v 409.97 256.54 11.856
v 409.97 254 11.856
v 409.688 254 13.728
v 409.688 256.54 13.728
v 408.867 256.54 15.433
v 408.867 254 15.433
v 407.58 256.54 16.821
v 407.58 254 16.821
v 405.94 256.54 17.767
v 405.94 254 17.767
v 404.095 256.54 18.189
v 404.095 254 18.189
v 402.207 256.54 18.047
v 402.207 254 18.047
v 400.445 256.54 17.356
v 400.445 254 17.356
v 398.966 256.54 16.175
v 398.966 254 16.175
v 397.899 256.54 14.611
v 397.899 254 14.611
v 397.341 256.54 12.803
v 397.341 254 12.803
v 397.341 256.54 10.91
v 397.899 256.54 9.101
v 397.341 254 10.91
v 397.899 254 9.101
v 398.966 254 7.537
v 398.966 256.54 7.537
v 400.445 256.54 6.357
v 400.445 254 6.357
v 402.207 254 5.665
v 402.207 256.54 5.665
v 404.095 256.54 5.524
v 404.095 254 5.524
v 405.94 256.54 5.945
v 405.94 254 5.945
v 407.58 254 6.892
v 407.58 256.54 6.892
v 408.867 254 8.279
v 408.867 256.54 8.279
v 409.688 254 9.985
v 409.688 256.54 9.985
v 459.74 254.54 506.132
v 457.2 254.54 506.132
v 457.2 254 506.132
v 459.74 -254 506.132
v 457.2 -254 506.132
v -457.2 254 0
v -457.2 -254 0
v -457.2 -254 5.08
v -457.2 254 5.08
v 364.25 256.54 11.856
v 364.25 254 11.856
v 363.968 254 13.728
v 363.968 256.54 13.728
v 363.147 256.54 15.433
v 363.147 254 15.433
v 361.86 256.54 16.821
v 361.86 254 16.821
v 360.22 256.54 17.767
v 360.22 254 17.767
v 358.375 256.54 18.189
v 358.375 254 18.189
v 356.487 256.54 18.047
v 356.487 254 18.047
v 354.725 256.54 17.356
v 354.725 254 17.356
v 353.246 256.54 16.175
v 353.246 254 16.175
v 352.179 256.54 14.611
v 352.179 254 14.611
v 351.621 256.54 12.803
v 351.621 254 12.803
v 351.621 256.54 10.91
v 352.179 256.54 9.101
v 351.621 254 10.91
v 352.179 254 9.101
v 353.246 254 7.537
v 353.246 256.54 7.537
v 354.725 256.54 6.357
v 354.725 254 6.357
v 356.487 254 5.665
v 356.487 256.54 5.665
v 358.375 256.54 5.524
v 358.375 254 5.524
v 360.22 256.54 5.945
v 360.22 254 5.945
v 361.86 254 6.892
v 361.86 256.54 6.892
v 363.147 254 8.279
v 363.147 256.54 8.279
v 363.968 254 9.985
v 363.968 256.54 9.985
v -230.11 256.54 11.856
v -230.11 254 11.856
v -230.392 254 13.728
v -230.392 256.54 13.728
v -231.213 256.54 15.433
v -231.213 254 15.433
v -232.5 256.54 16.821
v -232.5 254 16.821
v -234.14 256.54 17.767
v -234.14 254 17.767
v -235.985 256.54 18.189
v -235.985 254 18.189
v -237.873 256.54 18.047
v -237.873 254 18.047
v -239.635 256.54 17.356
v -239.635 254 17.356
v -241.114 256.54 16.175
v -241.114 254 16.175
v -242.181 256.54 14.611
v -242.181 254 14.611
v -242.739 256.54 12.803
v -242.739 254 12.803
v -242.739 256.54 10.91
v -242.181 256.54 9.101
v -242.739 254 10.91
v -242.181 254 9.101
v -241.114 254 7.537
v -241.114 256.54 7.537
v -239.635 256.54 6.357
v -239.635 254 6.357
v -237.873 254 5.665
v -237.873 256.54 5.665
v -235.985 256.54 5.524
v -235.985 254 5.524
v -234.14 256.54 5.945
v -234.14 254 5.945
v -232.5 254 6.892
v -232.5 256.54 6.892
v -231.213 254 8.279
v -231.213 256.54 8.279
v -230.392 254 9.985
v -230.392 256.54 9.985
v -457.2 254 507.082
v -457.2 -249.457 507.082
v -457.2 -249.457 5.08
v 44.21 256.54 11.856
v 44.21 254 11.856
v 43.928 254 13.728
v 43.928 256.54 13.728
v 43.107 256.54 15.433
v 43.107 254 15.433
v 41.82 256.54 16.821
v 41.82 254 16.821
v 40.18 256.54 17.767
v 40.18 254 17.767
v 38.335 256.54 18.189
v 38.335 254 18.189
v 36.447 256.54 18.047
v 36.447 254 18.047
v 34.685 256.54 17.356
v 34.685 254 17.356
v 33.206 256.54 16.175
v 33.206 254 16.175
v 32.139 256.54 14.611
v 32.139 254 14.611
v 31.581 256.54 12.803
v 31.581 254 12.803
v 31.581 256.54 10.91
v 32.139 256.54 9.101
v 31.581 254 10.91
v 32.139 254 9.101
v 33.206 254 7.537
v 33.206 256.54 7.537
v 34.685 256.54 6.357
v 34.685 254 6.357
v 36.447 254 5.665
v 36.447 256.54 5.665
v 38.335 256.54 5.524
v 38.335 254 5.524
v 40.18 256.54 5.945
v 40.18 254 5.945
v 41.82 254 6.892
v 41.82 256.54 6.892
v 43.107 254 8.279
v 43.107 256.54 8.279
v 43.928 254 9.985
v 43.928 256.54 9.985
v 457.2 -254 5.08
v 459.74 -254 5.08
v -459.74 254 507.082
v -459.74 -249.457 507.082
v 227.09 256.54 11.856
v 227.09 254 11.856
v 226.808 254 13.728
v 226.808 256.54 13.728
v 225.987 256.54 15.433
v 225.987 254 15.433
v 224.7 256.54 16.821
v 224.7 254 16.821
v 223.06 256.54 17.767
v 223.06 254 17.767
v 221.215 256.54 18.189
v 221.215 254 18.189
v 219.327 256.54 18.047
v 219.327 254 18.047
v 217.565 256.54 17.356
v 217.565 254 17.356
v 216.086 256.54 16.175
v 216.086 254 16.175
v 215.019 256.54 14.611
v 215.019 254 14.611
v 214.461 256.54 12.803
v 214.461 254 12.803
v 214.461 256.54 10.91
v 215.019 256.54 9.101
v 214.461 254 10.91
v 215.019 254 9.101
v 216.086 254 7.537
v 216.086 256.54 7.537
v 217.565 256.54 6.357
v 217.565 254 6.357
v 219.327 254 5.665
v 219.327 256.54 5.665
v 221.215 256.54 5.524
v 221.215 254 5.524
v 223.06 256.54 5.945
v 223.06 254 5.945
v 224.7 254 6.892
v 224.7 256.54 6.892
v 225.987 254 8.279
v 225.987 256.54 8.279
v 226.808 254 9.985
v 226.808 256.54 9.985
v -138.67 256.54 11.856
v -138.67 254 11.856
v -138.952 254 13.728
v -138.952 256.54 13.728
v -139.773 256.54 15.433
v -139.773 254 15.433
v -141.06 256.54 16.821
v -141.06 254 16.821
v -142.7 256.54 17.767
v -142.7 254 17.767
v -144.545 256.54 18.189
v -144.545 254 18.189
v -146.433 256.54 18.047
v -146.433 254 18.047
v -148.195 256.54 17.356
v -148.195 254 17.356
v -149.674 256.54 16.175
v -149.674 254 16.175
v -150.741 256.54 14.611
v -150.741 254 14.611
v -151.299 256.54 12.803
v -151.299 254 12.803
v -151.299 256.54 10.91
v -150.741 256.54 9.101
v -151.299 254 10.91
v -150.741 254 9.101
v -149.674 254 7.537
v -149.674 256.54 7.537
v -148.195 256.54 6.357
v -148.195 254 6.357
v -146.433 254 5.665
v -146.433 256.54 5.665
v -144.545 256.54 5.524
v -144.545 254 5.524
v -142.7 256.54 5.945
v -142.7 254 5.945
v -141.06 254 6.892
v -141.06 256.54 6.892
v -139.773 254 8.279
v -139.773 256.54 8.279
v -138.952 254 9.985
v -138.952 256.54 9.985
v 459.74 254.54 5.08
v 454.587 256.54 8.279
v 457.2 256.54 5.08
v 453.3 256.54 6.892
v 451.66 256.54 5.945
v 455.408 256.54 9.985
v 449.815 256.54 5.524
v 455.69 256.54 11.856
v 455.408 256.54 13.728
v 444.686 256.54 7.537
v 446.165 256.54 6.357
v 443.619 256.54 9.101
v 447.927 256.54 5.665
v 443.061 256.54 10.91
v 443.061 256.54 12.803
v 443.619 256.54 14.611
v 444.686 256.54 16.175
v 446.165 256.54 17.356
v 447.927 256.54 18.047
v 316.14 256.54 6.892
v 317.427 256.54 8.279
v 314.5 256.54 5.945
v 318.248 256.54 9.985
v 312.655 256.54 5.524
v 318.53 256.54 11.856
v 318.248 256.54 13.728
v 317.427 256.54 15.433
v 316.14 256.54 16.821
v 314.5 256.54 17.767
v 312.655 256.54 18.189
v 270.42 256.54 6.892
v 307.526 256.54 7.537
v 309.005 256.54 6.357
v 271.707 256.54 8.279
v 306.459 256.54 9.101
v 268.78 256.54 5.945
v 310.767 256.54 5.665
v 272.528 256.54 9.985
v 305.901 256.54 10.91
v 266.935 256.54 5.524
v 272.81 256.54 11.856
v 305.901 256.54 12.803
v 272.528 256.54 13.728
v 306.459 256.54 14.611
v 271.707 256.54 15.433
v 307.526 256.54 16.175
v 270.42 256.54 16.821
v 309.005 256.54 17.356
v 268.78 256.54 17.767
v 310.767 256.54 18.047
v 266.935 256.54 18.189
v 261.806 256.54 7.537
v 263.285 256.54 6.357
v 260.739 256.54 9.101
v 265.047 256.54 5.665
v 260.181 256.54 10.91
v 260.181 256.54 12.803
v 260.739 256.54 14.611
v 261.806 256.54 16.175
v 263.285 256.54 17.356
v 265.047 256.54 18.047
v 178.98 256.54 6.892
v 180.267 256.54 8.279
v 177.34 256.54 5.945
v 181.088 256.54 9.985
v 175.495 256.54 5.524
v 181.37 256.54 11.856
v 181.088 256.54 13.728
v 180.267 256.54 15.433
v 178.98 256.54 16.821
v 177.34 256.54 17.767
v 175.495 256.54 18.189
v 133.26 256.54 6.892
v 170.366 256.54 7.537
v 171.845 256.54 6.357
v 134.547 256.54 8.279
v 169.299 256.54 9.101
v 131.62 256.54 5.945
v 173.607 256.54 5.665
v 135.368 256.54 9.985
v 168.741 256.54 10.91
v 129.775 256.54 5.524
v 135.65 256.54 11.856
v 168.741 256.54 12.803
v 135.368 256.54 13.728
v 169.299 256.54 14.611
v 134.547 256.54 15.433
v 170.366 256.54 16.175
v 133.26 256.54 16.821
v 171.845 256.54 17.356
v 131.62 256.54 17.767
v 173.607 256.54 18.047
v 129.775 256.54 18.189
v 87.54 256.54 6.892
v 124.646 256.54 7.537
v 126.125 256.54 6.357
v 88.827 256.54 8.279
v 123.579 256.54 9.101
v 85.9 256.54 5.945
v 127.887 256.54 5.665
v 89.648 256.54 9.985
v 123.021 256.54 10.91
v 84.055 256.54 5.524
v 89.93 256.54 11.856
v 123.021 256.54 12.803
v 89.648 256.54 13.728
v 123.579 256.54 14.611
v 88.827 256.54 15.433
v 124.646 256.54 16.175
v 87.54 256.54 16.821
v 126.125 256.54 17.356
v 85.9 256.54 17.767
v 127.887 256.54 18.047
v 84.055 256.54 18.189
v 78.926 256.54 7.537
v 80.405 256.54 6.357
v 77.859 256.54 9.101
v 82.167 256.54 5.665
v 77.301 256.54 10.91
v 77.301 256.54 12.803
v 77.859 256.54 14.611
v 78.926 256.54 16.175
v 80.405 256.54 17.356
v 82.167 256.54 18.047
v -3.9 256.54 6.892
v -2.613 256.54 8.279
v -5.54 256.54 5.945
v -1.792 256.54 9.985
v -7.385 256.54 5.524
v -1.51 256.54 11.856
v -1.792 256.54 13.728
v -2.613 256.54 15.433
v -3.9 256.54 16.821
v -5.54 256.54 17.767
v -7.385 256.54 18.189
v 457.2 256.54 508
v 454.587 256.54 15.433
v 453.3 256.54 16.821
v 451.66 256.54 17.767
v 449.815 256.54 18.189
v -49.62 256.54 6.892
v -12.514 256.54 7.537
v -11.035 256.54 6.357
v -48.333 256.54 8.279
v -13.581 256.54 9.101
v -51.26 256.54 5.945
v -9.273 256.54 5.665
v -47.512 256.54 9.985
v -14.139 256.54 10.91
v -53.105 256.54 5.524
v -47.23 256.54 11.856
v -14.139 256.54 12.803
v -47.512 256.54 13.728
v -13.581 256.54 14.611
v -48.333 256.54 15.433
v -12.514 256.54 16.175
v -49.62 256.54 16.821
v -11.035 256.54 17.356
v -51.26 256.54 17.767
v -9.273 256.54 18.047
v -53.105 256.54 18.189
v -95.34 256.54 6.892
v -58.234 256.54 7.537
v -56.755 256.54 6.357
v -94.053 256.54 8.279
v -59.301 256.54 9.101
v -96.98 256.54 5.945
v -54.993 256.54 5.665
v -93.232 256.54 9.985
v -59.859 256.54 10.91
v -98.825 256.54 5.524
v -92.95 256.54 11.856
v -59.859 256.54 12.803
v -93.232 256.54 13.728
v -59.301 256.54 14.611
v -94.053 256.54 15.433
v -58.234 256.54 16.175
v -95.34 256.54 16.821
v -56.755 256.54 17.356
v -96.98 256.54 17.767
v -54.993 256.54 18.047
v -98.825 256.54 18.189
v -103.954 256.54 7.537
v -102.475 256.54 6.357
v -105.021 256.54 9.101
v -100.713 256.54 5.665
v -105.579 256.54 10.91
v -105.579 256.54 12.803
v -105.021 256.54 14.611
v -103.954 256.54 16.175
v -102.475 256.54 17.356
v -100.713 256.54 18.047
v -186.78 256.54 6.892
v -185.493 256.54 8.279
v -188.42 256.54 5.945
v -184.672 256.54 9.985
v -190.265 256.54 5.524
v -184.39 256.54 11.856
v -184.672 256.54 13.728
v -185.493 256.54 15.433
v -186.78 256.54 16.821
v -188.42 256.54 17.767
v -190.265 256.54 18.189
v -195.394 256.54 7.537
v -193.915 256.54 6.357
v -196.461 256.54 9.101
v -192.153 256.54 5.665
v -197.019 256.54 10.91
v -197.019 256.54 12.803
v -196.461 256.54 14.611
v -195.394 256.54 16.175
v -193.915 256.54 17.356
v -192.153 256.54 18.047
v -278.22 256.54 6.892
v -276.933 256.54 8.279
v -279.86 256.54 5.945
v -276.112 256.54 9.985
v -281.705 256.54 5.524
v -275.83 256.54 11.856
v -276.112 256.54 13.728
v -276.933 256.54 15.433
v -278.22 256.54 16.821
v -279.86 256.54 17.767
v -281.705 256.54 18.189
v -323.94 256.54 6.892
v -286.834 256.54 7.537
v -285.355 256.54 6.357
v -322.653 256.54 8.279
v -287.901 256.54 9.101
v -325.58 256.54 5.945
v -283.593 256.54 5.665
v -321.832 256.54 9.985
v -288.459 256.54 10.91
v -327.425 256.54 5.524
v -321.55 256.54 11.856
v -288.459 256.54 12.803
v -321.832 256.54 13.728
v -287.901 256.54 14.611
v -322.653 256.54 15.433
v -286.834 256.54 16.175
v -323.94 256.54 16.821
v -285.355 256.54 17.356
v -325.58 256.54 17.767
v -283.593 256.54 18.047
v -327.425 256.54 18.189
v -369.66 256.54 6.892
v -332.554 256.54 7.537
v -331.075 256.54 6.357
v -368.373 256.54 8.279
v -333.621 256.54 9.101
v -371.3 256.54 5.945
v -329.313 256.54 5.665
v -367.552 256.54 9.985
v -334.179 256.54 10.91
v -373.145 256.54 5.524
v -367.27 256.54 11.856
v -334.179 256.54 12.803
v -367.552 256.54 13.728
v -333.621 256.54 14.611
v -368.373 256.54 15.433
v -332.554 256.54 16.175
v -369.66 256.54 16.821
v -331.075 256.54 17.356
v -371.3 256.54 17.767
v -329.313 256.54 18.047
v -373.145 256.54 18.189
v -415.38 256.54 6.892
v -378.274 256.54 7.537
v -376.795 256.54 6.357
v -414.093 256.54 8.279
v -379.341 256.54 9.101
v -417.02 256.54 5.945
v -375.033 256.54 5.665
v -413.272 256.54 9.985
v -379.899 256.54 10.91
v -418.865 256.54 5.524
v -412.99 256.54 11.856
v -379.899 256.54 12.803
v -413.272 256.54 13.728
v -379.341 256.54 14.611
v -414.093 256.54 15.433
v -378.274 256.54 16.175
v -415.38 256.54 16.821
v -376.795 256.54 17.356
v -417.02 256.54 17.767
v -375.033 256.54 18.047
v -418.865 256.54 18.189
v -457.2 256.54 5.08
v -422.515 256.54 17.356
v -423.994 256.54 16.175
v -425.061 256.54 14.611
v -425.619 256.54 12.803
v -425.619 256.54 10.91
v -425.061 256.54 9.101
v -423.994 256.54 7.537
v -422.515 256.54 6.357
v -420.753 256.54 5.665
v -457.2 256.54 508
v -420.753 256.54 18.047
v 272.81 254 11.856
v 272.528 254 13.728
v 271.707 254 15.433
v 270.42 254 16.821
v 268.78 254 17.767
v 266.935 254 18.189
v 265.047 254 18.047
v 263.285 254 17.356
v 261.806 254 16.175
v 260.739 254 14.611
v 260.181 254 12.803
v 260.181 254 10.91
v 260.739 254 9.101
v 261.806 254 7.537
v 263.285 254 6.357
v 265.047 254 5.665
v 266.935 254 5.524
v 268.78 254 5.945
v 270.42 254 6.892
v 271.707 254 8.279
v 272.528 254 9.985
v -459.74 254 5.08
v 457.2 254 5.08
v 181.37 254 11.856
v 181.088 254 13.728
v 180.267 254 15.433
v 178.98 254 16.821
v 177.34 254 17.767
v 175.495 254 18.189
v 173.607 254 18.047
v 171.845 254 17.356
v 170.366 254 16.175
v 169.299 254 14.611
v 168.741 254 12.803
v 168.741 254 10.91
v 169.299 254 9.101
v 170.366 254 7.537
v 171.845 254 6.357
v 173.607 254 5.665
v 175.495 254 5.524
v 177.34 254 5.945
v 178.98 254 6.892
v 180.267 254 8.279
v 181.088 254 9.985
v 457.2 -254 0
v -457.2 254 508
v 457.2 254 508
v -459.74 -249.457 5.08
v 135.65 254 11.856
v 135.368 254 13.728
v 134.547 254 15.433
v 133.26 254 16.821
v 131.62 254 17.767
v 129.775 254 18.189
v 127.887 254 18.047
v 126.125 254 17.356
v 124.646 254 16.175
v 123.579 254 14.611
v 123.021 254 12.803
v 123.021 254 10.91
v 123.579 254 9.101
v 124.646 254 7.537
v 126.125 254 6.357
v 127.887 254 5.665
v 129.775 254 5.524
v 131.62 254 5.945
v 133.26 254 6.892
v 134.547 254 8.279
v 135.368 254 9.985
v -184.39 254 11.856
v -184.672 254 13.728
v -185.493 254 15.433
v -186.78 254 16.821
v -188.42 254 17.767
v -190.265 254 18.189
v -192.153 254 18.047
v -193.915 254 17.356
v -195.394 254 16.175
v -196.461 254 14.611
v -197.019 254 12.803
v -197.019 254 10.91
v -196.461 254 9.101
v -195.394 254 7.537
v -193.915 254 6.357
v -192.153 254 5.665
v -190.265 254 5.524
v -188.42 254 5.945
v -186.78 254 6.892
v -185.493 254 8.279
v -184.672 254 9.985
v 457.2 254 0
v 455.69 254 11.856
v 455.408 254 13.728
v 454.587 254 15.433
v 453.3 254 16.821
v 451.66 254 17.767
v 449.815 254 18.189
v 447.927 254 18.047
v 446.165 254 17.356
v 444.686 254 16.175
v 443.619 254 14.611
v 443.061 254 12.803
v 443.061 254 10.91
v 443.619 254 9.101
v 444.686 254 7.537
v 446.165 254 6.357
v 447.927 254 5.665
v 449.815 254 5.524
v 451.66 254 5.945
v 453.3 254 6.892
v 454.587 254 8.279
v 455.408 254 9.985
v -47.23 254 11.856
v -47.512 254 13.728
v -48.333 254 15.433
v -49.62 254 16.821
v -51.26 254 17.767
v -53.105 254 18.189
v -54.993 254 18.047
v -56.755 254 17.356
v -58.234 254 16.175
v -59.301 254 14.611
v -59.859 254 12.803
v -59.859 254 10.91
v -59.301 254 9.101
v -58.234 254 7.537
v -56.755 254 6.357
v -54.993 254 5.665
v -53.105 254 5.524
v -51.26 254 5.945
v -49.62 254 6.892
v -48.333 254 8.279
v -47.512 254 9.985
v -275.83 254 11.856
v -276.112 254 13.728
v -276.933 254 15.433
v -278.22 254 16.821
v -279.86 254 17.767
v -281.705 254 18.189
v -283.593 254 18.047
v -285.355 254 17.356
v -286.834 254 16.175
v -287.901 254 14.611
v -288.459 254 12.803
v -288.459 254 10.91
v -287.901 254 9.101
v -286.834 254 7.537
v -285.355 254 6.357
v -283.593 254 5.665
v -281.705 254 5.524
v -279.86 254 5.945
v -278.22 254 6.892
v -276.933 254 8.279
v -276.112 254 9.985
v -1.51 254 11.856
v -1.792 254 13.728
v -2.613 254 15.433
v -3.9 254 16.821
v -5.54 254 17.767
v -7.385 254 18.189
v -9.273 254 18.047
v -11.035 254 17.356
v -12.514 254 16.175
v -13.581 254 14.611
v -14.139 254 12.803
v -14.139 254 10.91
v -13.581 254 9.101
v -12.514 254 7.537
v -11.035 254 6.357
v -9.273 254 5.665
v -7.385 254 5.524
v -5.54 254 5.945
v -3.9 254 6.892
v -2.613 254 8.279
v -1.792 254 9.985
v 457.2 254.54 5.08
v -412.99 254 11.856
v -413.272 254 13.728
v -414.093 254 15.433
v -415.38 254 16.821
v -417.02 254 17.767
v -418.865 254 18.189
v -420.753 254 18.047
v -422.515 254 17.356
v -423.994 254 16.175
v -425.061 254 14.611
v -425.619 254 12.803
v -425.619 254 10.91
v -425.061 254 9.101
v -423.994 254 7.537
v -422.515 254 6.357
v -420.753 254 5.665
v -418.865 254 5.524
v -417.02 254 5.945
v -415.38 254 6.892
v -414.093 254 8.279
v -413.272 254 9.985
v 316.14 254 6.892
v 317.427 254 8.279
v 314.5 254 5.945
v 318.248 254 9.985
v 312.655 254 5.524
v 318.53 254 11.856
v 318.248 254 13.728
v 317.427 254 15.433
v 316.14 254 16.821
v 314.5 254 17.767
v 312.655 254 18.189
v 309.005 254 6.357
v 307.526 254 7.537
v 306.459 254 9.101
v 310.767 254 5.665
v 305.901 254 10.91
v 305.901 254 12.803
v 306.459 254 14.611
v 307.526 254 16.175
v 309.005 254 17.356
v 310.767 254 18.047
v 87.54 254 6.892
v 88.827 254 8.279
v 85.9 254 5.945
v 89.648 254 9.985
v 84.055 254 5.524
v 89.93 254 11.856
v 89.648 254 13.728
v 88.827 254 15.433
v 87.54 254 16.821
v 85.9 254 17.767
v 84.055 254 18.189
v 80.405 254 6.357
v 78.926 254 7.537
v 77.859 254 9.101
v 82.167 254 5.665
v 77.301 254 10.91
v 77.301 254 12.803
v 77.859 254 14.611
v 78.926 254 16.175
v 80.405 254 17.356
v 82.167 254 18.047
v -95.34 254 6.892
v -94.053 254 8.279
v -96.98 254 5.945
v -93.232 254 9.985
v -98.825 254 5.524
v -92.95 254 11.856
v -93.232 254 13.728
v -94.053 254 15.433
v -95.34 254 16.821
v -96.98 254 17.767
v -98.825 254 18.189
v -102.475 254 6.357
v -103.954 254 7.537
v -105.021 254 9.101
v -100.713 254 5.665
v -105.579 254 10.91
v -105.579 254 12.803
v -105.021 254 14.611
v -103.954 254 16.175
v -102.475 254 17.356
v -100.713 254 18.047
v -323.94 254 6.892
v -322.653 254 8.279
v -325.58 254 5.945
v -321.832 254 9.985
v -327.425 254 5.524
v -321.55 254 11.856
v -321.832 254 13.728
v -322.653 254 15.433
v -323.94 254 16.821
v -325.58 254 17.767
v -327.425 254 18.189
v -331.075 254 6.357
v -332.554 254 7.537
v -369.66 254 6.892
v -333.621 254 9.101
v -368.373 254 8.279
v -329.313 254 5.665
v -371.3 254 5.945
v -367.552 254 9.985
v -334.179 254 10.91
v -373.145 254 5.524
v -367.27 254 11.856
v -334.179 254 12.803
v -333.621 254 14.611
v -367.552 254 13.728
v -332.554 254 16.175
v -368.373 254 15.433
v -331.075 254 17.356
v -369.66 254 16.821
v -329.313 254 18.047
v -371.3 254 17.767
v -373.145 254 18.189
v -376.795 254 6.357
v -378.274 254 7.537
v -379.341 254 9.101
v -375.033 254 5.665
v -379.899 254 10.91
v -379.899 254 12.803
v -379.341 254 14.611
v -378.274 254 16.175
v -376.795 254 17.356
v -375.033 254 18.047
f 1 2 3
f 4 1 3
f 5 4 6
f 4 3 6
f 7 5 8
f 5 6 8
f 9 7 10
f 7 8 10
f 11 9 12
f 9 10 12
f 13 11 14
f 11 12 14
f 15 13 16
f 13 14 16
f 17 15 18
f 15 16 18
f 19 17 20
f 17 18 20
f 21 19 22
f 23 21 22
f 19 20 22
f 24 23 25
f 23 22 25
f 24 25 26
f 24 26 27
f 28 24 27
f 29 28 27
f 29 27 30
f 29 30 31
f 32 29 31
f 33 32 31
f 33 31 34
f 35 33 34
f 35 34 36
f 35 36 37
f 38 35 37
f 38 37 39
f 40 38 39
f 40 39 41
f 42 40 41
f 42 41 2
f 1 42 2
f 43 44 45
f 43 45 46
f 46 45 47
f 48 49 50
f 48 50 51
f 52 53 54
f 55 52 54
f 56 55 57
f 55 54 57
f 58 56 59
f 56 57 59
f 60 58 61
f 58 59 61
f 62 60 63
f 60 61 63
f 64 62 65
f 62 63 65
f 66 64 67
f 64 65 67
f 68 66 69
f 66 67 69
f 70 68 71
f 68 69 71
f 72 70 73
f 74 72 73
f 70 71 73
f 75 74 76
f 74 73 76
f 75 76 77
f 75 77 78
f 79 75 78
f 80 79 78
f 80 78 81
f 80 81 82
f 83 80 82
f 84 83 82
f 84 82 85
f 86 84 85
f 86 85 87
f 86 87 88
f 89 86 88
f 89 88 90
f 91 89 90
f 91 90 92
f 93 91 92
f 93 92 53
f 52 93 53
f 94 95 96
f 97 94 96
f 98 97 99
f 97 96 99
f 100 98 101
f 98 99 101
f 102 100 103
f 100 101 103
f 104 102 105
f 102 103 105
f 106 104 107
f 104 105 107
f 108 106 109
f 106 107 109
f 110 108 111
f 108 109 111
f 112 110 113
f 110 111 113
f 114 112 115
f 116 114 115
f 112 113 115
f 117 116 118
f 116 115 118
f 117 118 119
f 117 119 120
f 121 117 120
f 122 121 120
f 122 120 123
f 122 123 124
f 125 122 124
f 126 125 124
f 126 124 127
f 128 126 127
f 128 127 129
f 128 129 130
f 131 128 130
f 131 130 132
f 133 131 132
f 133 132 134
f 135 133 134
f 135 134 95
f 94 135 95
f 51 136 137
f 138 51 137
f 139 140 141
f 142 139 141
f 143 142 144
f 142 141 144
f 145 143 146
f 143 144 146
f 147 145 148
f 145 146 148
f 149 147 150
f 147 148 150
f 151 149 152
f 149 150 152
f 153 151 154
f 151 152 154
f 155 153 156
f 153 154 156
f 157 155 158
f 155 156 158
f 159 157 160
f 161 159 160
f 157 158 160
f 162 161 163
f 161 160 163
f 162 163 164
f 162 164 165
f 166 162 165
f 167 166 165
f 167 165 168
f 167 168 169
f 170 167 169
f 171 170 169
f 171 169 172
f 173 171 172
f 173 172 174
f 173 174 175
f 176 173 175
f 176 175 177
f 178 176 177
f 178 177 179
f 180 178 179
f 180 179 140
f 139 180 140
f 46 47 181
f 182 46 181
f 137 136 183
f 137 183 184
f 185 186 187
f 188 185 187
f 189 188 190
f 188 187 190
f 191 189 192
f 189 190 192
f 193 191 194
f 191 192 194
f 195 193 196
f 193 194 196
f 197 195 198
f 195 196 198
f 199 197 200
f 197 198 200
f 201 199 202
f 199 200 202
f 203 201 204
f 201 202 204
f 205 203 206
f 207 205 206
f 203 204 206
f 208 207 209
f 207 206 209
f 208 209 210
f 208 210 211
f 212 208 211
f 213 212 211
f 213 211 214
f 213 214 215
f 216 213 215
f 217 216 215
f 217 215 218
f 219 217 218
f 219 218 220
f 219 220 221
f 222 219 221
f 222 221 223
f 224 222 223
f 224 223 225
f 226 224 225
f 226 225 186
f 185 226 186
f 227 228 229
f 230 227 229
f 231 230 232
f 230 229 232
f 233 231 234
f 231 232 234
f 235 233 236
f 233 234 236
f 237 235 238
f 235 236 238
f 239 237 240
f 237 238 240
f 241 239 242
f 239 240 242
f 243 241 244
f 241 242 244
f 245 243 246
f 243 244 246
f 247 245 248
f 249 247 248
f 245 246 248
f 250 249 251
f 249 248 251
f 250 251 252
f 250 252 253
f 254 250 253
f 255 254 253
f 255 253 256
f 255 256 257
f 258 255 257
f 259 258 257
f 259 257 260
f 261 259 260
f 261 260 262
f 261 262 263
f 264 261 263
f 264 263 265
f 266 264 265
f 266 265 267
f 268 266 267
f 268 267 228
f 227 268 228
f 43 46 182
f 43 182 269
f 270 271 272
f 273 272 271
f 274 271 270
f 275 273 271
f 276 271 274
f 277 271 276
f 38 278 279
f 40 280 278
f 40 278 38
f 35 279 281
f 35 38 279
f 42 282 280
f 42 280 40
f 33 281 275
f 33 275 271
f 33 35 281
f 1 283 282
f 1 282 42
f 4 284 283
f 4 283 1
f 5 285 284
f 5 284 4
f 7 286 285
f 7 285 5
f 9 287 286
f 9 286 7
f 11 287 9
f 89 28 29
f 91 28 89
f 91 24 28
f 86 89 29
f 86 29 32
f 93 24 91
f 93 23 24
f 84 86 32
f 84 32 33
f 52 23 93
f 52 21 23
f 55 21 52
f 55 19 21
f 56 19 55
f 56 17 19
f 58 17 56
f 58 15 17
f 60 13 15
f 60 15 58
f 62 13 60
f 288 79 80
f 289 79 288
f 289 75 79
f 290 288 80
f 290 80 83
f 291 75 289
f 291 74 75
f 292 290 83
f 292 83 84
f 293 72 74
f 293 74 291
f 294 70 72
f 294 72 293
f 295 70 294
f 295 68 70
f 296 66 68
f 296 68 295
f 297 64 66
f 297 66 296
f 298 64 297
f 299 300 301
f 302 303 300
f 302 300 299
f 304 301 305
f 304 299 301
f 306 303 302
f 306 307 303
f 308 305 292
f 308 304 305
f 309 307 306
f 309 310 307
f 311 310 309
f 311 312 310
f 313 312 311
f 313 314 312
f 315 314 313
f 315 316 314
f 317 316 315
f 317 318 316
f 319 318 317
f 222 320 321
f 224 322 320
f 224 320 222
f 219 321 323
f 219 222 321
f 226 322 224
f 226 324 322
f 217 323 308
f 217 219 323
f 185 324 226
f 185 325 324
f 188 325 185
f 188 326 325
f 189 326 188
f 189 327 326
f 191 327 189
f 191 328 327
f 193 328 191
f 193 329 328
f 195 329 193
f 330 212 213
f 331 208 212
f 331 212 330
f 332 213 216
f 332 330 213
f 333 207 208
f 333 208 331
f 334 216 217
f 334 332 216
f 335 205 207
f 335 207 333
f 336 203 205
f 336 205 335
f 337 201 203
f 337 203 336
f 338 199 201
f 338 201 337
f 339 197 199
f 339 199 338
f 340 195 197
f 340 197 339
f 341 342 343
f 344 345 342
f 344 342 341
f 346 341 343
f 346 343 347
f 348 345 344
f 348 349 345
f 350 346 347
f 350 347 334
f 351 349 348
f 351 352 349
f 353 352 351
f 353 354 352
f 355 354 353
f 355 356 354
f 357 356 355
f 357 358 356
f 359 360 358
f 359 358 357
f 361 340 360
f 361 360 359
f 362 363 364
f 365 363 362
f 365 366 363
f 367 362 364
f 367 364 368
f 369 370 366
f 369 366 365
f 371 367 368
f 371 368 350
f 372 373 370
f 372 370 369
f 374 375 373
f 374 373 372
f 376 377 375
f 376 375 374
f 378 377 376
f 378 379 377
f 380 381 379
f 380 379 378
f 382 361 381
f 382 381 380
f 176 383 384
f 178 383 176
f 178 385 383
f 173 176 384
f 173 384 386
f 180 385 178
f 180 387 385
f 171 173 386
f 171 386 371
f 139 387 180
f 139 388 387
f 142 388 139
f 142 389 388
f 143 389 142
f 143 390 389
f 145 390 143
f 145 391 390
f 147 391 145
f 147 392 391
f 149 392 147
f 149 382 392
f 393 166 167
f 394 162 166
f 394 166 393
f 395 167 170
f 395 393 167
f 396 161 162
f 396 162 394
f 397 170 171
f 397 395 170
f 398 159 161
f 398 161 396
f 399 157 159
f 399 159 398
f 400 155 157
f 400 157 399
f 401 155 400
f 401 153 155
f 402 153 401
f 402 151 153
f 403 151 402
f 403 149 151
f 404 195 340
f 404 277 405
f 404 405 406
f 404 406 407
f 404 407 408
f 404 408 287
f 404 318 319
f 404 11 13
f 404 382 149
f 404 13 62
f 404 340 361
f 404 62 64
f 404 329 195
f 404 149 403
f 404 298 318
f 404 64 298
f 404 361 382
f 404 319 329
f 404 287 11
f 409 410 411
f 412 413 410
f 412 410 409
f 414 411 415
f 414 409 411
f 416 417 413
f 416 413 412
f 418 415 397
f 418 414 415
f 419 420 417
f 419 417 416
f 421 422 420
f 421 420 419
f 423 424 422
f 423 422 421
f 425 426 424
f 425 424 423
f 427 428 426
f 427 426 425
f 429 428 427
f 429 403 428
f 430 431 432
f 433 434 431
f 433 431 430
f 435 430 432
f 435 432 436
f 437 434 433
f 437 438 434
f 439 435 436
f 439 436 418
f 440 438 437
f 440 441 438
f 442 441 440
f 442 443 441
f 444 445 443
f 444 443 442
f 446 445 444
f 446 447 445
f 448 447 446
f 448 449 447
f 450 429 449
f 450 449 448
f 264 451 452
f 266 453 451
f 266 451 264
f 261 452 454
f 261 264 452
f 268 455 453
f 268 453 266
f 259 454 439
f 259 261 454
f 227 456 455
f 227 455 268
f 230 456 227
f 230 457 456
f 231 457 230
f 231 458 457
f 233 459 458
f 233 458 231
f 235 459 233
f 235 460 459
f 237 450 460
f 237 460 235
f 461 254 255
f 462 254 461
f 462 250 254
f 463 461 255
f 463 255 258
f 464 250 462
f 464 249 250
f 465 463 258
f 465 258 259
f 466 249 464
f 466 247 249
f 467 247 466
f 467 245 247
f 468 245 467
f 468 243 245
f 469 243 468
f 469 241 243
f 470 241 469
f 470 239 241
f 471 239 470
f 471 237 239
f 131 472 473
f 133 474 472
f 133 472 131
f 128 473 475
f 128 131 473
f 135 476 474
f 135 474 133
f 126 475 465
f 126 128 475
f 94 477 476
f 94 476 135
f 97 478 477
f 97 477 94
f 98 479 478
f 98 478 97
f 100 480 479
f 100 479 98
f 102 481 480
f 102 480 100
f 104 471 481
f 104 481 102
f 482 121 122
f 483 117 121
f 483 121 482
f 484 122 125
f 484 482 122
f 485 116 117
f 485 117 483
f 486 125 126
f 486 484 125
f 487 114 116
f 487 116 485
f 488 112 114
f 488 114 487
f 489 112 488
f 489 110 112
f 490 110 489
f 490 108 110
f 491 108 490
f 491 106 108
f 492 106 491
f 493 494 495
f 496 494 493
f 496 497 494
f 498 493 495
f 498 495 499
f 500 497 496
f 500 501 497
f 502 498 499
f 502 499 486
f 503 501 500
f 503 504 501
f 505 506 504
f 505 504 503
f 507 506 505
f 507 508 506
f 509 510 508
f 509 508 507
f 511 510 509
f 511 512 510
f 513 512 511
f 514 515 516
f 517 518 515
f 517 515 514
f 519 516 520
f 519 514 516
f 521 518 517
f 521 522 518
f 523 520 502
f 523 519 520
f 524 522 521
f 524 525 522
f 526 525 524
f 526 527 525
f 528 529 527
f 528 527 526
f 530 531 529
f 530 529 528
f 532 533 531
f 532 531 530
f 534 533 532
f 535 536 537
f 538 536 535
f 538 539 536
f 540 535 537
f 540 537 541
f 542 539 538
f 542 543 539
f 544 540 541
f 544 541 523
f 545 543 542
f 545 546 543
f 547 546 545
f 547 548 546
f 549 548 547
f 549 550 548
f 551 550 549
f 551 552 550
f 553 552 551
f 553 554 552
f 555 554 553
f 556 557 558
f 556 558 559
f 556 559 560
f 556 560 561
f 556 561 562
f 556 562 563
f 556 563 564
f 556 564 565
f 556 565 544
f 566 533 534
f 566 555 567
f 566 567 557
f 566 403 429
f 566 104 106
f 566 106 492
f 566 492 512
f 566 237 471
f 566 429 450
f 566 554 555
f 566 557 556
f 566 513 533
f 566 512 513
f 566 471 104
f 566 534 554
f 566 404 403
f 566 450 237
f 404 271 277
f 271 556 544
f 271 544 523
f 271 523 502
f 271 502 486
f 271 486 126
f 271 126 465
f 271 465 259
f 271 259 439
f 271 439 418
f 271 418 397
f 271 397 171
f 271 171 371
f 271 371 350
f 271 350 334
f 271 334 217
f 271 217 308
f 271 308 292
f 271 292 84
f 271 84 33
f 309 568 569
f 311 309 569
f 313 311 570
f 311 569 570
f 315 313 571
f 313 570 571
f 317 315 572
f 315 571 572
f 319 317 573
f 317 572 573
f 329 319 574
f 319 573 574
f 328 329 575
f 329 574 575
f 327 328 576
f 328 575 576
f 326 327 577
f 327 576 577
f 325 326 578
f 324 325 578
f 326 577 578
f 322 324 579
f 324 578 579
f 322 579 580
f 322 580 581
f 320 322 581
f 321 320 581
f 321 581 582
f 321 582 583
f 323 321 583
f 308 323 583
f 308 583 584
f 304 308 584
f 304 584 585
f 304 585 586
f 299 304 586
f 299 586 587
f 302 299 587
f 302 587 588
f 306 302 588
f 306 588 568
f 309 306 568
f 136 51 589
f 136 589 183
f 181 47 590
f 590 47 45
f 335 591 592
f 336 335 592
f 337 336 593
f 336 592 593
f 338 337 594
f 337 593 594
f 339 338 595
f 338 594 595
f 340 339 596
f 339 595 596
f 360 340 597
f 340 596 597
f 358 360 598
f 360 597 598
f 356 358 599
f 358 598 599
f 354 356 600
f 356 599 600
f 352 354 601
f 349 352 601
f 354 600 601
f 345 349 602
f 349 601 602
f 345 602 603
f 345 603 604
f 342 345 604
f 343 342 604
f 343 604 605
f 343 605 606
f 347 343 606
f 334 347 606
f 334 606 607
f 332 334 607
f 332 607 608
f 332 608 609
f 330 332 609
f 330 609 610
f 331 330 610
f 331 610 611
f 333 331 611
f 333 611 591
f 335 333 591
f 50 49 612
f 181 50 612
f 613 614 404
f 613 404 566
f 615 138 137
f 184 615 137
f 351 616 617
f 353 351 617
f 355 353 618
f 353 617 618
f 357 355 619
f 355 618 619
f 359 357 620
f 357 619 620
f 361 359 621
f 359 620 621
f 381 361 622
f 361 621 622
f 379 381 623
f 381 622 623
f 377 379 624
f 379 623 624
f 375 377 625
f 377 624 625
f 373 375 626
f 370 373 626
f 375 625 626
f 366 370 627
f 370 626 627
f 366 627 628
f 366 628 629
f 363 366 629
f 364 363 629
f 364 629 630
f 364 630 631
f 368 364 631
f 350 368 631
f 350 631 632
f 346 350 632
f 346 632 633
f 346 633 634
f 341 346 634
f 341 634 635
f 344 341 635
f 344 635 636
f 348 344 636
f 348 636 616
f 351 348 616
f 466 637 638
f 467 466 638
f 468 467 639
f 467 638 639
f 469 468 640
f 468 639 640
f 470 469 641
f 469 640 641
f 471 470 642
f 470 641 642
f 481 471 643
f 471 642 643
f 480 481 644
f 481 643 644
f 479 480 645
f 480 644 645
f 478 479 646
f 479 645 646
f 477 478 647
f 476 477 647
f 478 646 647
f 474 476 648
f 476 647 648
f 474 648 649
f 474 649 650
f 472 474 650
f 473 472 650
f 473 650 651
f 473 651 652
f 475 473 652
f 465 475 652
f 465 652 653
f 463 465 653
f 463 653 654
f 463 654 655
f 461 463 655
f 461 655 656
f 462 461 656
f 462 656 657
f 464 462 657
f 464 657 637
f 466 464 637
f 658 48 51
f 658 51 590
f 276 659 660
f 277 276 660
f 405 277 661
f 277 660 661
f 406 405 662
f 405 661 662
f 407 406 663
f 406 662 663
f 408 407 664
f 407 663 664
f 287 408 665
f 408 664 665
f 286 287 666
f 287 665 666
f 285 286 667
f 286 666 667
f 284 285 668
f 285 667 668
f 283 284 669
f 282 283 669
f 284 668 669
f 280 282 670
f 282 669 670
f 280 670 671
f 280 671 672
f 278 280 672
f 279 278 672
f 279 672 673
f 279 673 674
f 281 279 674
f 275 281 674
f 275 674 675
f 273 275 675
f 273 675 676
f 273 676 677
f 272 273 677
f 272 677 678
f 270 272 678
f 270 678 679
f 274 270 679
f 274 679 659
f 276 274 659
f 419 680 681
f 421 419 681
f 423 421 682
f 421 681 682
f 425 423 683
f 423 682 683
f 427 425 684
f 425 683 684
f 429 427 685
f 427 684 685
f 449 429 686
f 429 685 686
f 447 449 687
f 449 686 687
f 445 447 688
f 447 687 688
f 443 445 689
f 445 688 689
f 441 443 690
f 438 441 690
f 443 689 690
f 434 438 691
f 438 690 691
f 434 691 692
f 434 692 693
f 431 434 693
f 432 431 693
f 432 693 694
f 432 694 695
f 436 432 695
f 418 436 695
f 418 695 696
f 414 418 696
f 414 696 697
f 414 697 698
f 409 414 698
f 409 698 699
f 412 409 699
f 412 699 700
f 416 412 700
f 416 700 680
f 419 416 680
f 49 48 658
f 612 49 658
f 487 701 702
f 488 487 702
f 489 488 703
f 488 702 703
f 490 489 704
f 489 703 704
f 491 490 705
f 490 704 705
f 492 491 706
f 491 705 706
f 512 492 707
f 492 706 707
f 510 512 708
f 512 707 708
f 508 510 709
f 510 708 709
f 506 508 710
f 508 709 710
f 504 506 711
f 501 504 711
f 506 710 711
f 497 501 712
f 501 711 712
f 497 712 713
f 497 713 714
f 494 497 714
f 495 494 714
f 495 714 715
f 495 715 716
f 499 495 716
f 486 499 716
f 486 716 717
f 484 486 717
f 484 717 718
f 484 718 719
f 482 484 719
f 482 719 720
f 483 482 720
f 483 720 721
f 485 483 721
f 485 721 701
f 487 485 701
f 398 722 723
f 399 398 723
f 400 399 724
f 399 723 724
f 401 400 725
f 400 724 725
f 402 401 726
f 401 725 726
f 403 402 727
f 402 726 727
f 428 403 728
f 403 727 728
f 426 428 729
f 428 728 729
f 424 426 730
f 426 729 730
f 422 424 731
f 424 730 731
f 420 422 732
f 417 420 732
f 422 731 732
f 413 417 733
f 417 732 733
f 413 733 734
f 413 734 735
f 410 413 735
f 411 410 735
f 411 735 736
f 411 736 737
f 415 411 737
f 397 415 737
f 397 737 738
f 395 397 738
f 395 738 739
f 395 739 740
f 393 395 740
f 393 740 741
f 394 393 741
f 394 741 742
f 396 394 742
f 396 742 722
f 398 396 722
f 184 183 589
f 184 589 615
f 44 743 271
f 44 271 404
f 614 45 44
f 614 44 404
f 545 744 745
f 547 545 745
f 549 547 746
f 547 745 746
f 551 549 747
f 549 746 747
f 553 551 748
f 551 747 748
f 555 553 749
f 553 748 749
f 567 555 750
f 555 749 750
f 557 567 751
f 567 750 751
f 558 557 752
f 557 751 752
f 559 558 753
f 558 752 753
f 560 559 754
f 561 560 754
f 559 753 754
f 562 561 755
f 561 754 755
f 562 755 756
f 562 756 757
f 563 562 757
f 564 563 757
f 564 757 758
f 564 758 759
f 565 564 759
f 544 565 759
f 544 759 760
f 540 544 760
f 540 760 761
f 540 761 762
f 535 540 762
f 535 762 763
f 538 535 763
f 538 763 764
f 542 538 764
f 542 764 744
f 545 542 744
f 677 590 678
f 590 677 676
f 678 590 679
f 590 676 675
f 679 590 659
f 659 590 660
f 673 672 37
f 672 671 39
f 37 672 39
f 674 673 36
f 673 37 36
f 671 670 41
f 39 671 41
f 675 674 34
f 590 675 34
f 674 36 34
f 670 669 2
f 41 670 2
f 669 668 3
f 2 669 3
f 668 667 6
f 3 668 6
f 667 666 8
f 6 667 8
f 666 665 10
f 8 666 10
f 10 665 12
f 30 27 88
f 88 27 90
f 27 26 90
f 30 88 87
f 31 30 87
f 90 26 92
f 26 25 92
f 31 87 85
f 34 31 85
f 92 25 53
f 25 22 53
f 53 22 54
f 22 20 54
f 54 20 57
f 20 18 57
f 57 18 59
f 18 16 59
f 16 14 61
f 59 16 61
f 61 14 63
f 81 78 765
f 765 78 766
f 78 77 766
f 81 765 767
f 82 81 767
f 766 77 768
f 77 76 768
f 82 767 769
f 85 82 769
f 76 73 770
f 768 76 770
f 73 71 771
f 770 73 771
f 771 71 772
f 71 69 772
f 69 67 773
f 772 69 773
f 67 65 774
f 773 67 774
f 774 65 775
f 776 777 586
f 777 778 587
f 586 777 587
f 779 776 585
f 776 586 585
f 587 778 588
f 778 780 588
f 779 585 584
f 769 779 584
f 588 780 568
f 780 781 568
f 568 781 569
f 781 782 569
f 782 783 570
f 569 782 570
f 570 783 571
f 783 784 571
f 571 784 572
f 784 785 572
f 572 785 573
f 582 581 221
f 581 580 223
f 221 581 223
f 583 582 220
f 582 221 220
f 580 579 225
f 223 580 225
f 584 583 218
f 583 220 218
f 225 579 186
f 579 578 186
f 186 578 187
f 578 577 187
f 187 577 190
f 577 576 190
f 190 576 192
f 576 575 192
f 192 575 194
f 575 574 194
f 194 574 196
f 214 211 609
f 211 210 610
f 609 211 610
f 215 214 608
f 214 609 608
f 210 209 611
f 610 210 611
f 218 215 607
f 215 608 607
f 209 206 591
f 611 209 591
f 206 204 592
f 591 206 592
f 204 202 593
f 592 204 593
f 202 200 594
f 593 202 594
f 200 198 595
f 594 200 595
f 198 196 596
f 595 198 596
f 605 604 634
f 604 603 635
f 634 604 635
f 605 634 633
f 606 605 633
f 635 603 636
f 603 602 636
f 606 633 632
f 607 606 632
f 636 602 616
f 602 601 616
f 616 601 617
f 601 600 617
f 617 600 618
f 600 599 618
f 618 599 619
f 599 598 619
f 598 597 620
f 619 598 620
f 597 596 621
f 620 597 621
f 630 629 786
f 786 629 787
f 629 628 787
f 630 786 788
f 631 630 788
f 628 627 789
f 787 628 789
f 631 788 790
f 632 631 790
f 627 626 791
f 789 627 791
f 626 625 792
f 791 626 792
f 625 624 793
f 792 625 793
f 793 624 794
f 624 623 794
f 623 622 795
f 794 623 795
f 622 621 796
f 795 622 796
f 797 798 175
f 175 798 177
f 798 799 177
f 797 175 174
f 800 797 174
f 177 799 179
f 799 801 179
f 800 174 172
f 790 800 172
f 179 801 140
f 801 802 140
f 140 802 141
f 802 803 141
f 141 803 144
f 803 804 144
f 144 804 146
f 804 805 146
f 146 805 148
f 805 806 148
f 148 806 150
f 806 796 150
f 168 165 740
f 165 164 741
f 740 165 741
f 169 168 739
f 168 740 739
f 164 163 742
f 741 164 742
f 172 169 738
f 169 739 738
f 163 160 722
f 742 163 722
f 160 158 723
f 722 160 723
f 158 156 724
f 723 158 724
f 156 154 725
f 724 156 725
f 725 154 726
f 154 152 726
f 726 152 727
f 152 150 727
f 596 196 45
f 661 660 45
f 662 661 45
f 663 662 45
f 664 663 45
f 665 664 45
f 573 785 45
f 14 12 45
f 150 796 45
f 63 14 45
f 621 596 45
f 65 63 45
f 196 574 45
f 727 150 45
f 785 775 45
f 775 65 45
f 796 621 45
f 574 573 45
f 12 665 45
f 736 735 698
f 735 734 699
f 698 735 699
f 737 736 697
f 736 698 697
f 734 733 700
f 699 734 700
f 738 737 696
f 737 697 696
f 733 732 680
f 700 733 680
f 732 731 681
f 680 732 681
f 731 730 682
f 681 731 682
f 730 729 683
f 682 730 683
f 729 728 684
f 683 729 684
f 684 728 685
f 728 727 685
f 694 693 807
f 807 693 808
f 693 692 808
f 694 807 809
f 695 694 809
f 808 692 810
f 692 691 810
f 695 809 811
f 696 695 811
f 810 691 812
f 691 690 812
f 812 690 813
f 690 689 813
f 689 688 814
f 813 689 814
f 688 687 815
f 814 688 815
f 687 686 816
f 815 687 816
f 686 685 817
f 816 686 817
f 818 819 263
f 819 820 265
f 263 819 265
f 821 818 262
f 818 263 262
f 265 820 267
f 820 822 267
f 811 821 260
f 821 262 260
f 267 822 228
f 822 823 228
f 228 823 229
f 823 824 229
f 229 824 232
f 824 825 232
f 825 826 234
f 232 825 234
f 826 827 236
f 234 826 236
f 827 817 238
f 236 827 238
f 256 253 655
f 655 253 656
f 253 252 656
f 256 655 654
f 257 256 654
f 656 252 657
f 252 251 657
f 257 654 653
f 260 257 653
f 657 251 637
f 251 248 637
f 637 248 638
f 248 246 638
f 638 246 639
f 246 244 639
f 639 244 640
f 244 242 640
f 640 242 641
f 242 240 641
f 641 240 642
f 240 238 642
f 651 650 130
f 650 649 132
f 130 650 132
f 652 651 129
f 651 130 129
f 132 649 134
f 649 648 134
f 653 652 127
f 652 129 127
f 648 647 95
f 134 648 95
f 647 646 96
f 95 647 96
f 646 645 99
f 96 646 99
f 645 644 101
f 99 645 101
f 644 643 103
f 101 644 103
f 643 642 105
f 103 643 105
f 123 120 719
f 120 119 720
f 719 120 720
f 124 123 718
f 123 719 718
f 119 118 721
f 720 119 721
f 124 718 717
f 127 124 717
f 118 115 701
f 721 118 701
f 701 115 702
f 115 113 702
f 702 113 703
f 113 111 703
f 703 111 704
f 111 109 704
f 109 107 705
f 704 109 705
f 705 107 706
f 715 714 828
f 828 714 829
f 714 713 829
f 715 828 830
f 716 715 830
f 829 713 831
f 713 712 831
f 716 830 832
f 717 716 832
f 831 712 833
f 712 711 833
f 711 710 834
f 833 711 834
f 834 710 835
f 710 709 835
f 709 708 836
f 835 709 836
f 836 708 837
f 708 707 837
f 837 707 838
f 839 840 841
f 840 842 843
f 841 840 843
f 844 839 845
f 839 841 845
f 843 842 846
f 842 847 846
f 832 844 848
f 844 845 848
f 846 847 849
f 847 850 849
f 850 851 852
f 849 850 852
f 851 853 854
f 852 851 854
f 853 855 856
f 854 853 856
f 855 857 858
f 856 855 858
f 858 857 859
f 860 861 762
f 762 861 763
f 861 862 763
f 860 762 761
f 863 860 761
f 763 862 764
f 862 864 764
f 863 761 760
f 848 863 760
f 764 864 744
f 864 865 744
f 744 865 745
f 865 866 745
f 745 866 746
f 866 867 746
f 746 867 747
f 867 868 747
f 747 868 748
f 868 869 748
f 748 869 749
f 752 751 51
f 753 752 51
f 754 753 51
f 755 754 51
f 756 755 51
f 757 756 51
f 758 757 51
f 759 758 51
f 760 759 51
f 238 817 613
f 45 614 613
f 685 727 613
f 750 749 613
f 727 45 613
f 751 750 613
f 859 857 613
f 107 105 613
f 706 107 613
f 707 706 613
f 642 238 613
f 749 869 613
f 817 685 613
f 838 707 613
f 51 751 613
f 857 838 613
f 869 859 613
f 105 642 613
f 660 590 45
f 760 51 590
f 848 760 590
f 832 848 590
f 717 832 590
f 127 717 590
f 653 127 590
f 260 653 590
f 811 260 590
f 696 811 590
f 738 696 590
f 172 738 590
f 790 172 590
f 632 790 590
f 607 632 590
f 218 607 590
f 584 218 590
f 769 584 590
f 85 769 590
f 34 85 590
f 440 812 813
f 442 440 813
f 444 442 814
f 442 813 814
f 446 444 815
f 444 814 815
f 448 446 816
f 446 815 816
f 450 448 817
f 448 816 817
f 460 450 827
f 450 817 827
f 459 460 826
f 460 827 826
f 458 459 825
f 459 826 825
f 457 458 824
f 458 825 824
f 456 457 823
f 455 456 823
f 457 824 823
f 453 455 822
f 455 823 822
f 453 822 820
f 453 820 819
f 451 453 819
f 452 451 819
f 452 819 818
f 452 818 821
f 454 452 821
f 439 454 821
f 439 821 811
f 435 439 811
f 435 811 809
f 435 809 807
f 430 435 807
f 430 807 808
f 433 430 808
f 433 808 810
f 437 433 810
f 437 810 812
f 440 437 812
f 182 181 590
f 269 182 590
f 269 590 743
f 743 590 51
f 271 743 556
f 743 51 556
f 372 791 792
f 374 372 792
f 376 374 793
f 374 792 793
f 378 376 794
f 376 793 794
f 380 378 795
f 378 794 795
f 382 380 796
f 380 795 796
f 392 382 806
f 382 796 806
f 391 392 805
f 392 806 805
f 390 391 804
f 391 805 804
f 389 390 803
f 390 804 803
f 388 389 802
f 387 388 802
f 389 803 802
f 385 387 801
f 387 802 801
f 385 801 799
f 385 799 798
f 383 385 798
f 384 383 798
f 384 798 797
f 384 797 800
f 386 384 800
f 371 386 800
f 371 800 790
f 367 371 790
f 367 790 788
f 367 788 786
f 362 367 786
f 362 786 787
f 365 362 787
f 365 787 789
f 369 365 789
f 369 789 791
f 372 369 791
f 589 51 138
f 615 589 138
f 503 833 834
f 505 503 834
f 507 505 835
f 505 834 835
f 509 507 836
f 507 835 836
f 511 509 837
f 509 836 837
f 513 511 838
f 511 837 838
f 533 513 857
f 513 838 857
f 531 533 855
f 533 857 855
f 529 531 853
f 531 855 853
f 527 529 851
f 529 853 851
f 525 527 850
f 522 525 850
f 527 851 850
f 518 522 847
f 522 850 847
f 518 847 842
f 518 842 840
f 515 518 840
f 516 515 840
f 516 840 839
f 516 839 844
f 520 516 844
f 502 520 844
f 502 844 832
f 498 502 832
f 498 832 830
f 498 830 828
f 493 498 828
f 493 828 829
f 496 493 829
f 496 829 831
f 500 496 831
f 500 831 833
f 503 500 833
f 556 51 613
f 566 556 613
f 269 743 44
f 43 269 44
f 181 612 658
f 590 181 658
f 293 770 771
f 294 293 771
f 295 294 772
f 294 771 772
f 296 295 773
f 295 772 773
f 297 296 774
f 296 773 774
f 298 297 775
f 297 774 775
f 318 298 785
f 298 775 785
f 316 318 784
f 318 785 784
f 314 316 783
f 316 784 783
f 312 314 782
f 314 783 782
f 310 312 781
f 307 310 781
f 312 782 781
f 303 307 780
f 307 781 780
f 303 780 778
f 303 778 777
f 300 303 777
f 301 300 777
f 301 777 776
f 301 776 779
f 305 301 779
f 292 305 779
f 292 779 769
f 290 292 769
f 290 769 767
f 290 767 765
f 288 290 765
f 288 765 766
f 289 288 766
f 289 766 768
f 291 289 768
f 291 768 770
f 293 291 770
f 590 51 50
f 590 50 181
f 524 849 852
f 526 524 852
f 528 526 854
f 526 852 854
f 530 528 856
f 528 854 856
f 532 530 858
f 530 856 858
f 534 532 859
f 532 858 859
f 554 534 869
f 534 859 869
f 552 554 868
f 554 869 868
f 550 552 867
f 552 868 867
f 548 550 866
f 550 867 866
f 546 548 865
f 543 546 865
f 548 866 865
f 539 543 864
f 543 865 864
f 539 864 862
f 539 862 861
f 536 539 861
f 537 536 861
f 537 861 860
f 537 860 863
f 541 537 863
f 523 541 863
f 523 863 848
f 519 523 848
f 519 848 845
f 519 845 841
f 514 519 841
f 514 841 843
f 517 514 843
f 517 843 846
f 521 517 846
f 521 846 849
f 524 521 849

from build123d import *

# Parameters (mm, degrees)
F0_W     = 914.4
F0_H     = 508
F1_DEPTH = 5.08
F2_W     = 914.4
F2_H     = 502.92
F3_DEPTH = 2.54
F4_W     = 503.456629
F4_H     = 502.001568
F5_DEPTH = 2.54
F7_DEPTH = 2.54
F9_D     = 12.7
F9_DEPTH = 7.366


with BuildPart() as f1:
    # F0 (on Top) → F1 (new body)
    with BuildSketch(Plane.XY):
        Rectangle(F0_W, F0_H)
    extrude(amount=F1_DEPTH)



with BuildPart() as f3:
    # F2 (on face) → F3 (new body)
    with BuildSketch(Plane(origin=(0, 254, 0), x_dir=(-1, 0, 0), z_dir=(0, 1, 0))):
        with Locations((0, 256.54)):
            Rectangle(F2_W, F2_H)
    extrude(amount=F3_DEPTH)


with BuildPart() as f5:
    # F4 (on face) → F5 (new body)
    with BuildSketch(Plane(origin=(-457.2, 0, 0), x_dir=(0, -1, 0), z_dir=(-1, 0, 0))):
        with Locations((-2.271686, 256.080784)):
            Rectangle(F4_W, F4_H)
    extrude(amount=F5_DEPTH)


with BuildPart() as f1_1:
    add(f1.part)

    add(f3.part)  # F7 merges F3
    # F6 (on face) → F7 (join)
    with BuildSketch(Plane.YZ.offset(457.2)):
        Polygon((-254, 506.131947), (-254, 5.08), (254, 5.08), (254.540116, 5.08), (254.540116, 506.131947), align=None)
    extrude(amount=F7_DEPTH)

    # F9
    with Locations(Plane(origin=(0, 256.54, 0), x_dir=(-1, 0, 0), z_dir=(0, 1, 0))):
        with Locations((-403.620403, 11.856291), (-449.340403, 11.856291), (-357.900403, 11.856291), (-312.180403, 11.856291), (-266.460403, 11.856291), (-220.740403, 11.856291), (-175.020403, 11.856291), (-129.300403, 11.856291), (-83.580403, 11.856291), (-37.860403, 11.856291), (7.859597, 11.856291), (53.579597, 11.856291), (99.299597, 11.856291), (145.019597, 11.856291), (190.739597, 11.856291), (236.459597, 11.856291), (282.179597, 11.856291), (327.899597, 11.856291), (373.619597, 11.856291), (419.339597, 11.856291)):
            Hole(F9_D / 2, depth=F9_DEPTH)


solid = Compound([f5.part, f1_1.part])
